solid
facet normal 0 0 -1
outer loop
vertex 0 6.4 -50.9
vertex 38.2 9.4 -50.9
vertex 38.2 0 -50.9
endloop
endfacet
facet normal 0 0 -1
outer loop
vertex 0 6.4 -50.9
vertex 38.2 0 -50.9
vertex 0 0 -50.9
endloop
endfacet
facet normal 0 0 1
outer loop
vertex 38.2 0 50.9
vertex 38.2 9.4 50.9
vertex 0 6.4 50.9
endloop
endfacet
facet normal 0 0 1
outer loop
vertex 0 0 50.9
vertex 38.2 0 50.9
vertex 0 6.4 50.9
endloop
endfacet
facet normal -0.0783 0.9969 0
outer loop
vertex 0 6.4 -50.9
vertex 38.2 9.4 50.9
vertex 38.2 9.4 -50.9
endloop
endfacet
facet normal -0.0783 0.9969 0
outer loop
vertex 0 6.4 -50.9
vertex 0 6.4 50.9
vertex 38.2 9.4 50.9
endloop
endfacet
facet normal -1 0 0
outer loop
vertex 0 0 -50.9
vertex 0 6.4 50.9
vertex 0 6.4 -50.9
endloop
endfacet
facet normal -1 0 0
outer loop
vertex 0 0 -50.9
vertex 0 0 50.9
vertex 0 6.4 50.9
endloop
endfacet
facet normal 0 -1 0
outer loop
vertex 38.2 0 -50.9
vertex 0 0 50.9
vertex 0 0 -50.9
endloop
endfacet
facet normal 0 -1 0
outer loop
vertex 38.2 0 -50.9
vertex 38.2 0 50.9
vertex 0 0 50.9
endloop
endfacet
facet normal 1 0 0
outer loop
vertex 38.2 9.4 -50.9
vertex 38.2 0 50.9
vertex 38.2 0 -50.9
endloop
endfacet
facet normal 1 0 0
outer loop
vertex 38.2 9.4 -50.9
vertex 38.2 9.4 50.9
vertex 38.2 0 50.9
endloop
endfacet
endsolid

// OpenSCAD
frontHeight = 6.4;
backHeight = 9.4;
depth = 101.8;
width = 38.2;

point1 = [0, 0];
point2 = [0, frontHeight];
point3 = [width, backHeight];
point4 = [width, 0];

points = [point1, point2, point3, point4];

linear_extrude(height=depth, center=true){
    polygon(points);
}
